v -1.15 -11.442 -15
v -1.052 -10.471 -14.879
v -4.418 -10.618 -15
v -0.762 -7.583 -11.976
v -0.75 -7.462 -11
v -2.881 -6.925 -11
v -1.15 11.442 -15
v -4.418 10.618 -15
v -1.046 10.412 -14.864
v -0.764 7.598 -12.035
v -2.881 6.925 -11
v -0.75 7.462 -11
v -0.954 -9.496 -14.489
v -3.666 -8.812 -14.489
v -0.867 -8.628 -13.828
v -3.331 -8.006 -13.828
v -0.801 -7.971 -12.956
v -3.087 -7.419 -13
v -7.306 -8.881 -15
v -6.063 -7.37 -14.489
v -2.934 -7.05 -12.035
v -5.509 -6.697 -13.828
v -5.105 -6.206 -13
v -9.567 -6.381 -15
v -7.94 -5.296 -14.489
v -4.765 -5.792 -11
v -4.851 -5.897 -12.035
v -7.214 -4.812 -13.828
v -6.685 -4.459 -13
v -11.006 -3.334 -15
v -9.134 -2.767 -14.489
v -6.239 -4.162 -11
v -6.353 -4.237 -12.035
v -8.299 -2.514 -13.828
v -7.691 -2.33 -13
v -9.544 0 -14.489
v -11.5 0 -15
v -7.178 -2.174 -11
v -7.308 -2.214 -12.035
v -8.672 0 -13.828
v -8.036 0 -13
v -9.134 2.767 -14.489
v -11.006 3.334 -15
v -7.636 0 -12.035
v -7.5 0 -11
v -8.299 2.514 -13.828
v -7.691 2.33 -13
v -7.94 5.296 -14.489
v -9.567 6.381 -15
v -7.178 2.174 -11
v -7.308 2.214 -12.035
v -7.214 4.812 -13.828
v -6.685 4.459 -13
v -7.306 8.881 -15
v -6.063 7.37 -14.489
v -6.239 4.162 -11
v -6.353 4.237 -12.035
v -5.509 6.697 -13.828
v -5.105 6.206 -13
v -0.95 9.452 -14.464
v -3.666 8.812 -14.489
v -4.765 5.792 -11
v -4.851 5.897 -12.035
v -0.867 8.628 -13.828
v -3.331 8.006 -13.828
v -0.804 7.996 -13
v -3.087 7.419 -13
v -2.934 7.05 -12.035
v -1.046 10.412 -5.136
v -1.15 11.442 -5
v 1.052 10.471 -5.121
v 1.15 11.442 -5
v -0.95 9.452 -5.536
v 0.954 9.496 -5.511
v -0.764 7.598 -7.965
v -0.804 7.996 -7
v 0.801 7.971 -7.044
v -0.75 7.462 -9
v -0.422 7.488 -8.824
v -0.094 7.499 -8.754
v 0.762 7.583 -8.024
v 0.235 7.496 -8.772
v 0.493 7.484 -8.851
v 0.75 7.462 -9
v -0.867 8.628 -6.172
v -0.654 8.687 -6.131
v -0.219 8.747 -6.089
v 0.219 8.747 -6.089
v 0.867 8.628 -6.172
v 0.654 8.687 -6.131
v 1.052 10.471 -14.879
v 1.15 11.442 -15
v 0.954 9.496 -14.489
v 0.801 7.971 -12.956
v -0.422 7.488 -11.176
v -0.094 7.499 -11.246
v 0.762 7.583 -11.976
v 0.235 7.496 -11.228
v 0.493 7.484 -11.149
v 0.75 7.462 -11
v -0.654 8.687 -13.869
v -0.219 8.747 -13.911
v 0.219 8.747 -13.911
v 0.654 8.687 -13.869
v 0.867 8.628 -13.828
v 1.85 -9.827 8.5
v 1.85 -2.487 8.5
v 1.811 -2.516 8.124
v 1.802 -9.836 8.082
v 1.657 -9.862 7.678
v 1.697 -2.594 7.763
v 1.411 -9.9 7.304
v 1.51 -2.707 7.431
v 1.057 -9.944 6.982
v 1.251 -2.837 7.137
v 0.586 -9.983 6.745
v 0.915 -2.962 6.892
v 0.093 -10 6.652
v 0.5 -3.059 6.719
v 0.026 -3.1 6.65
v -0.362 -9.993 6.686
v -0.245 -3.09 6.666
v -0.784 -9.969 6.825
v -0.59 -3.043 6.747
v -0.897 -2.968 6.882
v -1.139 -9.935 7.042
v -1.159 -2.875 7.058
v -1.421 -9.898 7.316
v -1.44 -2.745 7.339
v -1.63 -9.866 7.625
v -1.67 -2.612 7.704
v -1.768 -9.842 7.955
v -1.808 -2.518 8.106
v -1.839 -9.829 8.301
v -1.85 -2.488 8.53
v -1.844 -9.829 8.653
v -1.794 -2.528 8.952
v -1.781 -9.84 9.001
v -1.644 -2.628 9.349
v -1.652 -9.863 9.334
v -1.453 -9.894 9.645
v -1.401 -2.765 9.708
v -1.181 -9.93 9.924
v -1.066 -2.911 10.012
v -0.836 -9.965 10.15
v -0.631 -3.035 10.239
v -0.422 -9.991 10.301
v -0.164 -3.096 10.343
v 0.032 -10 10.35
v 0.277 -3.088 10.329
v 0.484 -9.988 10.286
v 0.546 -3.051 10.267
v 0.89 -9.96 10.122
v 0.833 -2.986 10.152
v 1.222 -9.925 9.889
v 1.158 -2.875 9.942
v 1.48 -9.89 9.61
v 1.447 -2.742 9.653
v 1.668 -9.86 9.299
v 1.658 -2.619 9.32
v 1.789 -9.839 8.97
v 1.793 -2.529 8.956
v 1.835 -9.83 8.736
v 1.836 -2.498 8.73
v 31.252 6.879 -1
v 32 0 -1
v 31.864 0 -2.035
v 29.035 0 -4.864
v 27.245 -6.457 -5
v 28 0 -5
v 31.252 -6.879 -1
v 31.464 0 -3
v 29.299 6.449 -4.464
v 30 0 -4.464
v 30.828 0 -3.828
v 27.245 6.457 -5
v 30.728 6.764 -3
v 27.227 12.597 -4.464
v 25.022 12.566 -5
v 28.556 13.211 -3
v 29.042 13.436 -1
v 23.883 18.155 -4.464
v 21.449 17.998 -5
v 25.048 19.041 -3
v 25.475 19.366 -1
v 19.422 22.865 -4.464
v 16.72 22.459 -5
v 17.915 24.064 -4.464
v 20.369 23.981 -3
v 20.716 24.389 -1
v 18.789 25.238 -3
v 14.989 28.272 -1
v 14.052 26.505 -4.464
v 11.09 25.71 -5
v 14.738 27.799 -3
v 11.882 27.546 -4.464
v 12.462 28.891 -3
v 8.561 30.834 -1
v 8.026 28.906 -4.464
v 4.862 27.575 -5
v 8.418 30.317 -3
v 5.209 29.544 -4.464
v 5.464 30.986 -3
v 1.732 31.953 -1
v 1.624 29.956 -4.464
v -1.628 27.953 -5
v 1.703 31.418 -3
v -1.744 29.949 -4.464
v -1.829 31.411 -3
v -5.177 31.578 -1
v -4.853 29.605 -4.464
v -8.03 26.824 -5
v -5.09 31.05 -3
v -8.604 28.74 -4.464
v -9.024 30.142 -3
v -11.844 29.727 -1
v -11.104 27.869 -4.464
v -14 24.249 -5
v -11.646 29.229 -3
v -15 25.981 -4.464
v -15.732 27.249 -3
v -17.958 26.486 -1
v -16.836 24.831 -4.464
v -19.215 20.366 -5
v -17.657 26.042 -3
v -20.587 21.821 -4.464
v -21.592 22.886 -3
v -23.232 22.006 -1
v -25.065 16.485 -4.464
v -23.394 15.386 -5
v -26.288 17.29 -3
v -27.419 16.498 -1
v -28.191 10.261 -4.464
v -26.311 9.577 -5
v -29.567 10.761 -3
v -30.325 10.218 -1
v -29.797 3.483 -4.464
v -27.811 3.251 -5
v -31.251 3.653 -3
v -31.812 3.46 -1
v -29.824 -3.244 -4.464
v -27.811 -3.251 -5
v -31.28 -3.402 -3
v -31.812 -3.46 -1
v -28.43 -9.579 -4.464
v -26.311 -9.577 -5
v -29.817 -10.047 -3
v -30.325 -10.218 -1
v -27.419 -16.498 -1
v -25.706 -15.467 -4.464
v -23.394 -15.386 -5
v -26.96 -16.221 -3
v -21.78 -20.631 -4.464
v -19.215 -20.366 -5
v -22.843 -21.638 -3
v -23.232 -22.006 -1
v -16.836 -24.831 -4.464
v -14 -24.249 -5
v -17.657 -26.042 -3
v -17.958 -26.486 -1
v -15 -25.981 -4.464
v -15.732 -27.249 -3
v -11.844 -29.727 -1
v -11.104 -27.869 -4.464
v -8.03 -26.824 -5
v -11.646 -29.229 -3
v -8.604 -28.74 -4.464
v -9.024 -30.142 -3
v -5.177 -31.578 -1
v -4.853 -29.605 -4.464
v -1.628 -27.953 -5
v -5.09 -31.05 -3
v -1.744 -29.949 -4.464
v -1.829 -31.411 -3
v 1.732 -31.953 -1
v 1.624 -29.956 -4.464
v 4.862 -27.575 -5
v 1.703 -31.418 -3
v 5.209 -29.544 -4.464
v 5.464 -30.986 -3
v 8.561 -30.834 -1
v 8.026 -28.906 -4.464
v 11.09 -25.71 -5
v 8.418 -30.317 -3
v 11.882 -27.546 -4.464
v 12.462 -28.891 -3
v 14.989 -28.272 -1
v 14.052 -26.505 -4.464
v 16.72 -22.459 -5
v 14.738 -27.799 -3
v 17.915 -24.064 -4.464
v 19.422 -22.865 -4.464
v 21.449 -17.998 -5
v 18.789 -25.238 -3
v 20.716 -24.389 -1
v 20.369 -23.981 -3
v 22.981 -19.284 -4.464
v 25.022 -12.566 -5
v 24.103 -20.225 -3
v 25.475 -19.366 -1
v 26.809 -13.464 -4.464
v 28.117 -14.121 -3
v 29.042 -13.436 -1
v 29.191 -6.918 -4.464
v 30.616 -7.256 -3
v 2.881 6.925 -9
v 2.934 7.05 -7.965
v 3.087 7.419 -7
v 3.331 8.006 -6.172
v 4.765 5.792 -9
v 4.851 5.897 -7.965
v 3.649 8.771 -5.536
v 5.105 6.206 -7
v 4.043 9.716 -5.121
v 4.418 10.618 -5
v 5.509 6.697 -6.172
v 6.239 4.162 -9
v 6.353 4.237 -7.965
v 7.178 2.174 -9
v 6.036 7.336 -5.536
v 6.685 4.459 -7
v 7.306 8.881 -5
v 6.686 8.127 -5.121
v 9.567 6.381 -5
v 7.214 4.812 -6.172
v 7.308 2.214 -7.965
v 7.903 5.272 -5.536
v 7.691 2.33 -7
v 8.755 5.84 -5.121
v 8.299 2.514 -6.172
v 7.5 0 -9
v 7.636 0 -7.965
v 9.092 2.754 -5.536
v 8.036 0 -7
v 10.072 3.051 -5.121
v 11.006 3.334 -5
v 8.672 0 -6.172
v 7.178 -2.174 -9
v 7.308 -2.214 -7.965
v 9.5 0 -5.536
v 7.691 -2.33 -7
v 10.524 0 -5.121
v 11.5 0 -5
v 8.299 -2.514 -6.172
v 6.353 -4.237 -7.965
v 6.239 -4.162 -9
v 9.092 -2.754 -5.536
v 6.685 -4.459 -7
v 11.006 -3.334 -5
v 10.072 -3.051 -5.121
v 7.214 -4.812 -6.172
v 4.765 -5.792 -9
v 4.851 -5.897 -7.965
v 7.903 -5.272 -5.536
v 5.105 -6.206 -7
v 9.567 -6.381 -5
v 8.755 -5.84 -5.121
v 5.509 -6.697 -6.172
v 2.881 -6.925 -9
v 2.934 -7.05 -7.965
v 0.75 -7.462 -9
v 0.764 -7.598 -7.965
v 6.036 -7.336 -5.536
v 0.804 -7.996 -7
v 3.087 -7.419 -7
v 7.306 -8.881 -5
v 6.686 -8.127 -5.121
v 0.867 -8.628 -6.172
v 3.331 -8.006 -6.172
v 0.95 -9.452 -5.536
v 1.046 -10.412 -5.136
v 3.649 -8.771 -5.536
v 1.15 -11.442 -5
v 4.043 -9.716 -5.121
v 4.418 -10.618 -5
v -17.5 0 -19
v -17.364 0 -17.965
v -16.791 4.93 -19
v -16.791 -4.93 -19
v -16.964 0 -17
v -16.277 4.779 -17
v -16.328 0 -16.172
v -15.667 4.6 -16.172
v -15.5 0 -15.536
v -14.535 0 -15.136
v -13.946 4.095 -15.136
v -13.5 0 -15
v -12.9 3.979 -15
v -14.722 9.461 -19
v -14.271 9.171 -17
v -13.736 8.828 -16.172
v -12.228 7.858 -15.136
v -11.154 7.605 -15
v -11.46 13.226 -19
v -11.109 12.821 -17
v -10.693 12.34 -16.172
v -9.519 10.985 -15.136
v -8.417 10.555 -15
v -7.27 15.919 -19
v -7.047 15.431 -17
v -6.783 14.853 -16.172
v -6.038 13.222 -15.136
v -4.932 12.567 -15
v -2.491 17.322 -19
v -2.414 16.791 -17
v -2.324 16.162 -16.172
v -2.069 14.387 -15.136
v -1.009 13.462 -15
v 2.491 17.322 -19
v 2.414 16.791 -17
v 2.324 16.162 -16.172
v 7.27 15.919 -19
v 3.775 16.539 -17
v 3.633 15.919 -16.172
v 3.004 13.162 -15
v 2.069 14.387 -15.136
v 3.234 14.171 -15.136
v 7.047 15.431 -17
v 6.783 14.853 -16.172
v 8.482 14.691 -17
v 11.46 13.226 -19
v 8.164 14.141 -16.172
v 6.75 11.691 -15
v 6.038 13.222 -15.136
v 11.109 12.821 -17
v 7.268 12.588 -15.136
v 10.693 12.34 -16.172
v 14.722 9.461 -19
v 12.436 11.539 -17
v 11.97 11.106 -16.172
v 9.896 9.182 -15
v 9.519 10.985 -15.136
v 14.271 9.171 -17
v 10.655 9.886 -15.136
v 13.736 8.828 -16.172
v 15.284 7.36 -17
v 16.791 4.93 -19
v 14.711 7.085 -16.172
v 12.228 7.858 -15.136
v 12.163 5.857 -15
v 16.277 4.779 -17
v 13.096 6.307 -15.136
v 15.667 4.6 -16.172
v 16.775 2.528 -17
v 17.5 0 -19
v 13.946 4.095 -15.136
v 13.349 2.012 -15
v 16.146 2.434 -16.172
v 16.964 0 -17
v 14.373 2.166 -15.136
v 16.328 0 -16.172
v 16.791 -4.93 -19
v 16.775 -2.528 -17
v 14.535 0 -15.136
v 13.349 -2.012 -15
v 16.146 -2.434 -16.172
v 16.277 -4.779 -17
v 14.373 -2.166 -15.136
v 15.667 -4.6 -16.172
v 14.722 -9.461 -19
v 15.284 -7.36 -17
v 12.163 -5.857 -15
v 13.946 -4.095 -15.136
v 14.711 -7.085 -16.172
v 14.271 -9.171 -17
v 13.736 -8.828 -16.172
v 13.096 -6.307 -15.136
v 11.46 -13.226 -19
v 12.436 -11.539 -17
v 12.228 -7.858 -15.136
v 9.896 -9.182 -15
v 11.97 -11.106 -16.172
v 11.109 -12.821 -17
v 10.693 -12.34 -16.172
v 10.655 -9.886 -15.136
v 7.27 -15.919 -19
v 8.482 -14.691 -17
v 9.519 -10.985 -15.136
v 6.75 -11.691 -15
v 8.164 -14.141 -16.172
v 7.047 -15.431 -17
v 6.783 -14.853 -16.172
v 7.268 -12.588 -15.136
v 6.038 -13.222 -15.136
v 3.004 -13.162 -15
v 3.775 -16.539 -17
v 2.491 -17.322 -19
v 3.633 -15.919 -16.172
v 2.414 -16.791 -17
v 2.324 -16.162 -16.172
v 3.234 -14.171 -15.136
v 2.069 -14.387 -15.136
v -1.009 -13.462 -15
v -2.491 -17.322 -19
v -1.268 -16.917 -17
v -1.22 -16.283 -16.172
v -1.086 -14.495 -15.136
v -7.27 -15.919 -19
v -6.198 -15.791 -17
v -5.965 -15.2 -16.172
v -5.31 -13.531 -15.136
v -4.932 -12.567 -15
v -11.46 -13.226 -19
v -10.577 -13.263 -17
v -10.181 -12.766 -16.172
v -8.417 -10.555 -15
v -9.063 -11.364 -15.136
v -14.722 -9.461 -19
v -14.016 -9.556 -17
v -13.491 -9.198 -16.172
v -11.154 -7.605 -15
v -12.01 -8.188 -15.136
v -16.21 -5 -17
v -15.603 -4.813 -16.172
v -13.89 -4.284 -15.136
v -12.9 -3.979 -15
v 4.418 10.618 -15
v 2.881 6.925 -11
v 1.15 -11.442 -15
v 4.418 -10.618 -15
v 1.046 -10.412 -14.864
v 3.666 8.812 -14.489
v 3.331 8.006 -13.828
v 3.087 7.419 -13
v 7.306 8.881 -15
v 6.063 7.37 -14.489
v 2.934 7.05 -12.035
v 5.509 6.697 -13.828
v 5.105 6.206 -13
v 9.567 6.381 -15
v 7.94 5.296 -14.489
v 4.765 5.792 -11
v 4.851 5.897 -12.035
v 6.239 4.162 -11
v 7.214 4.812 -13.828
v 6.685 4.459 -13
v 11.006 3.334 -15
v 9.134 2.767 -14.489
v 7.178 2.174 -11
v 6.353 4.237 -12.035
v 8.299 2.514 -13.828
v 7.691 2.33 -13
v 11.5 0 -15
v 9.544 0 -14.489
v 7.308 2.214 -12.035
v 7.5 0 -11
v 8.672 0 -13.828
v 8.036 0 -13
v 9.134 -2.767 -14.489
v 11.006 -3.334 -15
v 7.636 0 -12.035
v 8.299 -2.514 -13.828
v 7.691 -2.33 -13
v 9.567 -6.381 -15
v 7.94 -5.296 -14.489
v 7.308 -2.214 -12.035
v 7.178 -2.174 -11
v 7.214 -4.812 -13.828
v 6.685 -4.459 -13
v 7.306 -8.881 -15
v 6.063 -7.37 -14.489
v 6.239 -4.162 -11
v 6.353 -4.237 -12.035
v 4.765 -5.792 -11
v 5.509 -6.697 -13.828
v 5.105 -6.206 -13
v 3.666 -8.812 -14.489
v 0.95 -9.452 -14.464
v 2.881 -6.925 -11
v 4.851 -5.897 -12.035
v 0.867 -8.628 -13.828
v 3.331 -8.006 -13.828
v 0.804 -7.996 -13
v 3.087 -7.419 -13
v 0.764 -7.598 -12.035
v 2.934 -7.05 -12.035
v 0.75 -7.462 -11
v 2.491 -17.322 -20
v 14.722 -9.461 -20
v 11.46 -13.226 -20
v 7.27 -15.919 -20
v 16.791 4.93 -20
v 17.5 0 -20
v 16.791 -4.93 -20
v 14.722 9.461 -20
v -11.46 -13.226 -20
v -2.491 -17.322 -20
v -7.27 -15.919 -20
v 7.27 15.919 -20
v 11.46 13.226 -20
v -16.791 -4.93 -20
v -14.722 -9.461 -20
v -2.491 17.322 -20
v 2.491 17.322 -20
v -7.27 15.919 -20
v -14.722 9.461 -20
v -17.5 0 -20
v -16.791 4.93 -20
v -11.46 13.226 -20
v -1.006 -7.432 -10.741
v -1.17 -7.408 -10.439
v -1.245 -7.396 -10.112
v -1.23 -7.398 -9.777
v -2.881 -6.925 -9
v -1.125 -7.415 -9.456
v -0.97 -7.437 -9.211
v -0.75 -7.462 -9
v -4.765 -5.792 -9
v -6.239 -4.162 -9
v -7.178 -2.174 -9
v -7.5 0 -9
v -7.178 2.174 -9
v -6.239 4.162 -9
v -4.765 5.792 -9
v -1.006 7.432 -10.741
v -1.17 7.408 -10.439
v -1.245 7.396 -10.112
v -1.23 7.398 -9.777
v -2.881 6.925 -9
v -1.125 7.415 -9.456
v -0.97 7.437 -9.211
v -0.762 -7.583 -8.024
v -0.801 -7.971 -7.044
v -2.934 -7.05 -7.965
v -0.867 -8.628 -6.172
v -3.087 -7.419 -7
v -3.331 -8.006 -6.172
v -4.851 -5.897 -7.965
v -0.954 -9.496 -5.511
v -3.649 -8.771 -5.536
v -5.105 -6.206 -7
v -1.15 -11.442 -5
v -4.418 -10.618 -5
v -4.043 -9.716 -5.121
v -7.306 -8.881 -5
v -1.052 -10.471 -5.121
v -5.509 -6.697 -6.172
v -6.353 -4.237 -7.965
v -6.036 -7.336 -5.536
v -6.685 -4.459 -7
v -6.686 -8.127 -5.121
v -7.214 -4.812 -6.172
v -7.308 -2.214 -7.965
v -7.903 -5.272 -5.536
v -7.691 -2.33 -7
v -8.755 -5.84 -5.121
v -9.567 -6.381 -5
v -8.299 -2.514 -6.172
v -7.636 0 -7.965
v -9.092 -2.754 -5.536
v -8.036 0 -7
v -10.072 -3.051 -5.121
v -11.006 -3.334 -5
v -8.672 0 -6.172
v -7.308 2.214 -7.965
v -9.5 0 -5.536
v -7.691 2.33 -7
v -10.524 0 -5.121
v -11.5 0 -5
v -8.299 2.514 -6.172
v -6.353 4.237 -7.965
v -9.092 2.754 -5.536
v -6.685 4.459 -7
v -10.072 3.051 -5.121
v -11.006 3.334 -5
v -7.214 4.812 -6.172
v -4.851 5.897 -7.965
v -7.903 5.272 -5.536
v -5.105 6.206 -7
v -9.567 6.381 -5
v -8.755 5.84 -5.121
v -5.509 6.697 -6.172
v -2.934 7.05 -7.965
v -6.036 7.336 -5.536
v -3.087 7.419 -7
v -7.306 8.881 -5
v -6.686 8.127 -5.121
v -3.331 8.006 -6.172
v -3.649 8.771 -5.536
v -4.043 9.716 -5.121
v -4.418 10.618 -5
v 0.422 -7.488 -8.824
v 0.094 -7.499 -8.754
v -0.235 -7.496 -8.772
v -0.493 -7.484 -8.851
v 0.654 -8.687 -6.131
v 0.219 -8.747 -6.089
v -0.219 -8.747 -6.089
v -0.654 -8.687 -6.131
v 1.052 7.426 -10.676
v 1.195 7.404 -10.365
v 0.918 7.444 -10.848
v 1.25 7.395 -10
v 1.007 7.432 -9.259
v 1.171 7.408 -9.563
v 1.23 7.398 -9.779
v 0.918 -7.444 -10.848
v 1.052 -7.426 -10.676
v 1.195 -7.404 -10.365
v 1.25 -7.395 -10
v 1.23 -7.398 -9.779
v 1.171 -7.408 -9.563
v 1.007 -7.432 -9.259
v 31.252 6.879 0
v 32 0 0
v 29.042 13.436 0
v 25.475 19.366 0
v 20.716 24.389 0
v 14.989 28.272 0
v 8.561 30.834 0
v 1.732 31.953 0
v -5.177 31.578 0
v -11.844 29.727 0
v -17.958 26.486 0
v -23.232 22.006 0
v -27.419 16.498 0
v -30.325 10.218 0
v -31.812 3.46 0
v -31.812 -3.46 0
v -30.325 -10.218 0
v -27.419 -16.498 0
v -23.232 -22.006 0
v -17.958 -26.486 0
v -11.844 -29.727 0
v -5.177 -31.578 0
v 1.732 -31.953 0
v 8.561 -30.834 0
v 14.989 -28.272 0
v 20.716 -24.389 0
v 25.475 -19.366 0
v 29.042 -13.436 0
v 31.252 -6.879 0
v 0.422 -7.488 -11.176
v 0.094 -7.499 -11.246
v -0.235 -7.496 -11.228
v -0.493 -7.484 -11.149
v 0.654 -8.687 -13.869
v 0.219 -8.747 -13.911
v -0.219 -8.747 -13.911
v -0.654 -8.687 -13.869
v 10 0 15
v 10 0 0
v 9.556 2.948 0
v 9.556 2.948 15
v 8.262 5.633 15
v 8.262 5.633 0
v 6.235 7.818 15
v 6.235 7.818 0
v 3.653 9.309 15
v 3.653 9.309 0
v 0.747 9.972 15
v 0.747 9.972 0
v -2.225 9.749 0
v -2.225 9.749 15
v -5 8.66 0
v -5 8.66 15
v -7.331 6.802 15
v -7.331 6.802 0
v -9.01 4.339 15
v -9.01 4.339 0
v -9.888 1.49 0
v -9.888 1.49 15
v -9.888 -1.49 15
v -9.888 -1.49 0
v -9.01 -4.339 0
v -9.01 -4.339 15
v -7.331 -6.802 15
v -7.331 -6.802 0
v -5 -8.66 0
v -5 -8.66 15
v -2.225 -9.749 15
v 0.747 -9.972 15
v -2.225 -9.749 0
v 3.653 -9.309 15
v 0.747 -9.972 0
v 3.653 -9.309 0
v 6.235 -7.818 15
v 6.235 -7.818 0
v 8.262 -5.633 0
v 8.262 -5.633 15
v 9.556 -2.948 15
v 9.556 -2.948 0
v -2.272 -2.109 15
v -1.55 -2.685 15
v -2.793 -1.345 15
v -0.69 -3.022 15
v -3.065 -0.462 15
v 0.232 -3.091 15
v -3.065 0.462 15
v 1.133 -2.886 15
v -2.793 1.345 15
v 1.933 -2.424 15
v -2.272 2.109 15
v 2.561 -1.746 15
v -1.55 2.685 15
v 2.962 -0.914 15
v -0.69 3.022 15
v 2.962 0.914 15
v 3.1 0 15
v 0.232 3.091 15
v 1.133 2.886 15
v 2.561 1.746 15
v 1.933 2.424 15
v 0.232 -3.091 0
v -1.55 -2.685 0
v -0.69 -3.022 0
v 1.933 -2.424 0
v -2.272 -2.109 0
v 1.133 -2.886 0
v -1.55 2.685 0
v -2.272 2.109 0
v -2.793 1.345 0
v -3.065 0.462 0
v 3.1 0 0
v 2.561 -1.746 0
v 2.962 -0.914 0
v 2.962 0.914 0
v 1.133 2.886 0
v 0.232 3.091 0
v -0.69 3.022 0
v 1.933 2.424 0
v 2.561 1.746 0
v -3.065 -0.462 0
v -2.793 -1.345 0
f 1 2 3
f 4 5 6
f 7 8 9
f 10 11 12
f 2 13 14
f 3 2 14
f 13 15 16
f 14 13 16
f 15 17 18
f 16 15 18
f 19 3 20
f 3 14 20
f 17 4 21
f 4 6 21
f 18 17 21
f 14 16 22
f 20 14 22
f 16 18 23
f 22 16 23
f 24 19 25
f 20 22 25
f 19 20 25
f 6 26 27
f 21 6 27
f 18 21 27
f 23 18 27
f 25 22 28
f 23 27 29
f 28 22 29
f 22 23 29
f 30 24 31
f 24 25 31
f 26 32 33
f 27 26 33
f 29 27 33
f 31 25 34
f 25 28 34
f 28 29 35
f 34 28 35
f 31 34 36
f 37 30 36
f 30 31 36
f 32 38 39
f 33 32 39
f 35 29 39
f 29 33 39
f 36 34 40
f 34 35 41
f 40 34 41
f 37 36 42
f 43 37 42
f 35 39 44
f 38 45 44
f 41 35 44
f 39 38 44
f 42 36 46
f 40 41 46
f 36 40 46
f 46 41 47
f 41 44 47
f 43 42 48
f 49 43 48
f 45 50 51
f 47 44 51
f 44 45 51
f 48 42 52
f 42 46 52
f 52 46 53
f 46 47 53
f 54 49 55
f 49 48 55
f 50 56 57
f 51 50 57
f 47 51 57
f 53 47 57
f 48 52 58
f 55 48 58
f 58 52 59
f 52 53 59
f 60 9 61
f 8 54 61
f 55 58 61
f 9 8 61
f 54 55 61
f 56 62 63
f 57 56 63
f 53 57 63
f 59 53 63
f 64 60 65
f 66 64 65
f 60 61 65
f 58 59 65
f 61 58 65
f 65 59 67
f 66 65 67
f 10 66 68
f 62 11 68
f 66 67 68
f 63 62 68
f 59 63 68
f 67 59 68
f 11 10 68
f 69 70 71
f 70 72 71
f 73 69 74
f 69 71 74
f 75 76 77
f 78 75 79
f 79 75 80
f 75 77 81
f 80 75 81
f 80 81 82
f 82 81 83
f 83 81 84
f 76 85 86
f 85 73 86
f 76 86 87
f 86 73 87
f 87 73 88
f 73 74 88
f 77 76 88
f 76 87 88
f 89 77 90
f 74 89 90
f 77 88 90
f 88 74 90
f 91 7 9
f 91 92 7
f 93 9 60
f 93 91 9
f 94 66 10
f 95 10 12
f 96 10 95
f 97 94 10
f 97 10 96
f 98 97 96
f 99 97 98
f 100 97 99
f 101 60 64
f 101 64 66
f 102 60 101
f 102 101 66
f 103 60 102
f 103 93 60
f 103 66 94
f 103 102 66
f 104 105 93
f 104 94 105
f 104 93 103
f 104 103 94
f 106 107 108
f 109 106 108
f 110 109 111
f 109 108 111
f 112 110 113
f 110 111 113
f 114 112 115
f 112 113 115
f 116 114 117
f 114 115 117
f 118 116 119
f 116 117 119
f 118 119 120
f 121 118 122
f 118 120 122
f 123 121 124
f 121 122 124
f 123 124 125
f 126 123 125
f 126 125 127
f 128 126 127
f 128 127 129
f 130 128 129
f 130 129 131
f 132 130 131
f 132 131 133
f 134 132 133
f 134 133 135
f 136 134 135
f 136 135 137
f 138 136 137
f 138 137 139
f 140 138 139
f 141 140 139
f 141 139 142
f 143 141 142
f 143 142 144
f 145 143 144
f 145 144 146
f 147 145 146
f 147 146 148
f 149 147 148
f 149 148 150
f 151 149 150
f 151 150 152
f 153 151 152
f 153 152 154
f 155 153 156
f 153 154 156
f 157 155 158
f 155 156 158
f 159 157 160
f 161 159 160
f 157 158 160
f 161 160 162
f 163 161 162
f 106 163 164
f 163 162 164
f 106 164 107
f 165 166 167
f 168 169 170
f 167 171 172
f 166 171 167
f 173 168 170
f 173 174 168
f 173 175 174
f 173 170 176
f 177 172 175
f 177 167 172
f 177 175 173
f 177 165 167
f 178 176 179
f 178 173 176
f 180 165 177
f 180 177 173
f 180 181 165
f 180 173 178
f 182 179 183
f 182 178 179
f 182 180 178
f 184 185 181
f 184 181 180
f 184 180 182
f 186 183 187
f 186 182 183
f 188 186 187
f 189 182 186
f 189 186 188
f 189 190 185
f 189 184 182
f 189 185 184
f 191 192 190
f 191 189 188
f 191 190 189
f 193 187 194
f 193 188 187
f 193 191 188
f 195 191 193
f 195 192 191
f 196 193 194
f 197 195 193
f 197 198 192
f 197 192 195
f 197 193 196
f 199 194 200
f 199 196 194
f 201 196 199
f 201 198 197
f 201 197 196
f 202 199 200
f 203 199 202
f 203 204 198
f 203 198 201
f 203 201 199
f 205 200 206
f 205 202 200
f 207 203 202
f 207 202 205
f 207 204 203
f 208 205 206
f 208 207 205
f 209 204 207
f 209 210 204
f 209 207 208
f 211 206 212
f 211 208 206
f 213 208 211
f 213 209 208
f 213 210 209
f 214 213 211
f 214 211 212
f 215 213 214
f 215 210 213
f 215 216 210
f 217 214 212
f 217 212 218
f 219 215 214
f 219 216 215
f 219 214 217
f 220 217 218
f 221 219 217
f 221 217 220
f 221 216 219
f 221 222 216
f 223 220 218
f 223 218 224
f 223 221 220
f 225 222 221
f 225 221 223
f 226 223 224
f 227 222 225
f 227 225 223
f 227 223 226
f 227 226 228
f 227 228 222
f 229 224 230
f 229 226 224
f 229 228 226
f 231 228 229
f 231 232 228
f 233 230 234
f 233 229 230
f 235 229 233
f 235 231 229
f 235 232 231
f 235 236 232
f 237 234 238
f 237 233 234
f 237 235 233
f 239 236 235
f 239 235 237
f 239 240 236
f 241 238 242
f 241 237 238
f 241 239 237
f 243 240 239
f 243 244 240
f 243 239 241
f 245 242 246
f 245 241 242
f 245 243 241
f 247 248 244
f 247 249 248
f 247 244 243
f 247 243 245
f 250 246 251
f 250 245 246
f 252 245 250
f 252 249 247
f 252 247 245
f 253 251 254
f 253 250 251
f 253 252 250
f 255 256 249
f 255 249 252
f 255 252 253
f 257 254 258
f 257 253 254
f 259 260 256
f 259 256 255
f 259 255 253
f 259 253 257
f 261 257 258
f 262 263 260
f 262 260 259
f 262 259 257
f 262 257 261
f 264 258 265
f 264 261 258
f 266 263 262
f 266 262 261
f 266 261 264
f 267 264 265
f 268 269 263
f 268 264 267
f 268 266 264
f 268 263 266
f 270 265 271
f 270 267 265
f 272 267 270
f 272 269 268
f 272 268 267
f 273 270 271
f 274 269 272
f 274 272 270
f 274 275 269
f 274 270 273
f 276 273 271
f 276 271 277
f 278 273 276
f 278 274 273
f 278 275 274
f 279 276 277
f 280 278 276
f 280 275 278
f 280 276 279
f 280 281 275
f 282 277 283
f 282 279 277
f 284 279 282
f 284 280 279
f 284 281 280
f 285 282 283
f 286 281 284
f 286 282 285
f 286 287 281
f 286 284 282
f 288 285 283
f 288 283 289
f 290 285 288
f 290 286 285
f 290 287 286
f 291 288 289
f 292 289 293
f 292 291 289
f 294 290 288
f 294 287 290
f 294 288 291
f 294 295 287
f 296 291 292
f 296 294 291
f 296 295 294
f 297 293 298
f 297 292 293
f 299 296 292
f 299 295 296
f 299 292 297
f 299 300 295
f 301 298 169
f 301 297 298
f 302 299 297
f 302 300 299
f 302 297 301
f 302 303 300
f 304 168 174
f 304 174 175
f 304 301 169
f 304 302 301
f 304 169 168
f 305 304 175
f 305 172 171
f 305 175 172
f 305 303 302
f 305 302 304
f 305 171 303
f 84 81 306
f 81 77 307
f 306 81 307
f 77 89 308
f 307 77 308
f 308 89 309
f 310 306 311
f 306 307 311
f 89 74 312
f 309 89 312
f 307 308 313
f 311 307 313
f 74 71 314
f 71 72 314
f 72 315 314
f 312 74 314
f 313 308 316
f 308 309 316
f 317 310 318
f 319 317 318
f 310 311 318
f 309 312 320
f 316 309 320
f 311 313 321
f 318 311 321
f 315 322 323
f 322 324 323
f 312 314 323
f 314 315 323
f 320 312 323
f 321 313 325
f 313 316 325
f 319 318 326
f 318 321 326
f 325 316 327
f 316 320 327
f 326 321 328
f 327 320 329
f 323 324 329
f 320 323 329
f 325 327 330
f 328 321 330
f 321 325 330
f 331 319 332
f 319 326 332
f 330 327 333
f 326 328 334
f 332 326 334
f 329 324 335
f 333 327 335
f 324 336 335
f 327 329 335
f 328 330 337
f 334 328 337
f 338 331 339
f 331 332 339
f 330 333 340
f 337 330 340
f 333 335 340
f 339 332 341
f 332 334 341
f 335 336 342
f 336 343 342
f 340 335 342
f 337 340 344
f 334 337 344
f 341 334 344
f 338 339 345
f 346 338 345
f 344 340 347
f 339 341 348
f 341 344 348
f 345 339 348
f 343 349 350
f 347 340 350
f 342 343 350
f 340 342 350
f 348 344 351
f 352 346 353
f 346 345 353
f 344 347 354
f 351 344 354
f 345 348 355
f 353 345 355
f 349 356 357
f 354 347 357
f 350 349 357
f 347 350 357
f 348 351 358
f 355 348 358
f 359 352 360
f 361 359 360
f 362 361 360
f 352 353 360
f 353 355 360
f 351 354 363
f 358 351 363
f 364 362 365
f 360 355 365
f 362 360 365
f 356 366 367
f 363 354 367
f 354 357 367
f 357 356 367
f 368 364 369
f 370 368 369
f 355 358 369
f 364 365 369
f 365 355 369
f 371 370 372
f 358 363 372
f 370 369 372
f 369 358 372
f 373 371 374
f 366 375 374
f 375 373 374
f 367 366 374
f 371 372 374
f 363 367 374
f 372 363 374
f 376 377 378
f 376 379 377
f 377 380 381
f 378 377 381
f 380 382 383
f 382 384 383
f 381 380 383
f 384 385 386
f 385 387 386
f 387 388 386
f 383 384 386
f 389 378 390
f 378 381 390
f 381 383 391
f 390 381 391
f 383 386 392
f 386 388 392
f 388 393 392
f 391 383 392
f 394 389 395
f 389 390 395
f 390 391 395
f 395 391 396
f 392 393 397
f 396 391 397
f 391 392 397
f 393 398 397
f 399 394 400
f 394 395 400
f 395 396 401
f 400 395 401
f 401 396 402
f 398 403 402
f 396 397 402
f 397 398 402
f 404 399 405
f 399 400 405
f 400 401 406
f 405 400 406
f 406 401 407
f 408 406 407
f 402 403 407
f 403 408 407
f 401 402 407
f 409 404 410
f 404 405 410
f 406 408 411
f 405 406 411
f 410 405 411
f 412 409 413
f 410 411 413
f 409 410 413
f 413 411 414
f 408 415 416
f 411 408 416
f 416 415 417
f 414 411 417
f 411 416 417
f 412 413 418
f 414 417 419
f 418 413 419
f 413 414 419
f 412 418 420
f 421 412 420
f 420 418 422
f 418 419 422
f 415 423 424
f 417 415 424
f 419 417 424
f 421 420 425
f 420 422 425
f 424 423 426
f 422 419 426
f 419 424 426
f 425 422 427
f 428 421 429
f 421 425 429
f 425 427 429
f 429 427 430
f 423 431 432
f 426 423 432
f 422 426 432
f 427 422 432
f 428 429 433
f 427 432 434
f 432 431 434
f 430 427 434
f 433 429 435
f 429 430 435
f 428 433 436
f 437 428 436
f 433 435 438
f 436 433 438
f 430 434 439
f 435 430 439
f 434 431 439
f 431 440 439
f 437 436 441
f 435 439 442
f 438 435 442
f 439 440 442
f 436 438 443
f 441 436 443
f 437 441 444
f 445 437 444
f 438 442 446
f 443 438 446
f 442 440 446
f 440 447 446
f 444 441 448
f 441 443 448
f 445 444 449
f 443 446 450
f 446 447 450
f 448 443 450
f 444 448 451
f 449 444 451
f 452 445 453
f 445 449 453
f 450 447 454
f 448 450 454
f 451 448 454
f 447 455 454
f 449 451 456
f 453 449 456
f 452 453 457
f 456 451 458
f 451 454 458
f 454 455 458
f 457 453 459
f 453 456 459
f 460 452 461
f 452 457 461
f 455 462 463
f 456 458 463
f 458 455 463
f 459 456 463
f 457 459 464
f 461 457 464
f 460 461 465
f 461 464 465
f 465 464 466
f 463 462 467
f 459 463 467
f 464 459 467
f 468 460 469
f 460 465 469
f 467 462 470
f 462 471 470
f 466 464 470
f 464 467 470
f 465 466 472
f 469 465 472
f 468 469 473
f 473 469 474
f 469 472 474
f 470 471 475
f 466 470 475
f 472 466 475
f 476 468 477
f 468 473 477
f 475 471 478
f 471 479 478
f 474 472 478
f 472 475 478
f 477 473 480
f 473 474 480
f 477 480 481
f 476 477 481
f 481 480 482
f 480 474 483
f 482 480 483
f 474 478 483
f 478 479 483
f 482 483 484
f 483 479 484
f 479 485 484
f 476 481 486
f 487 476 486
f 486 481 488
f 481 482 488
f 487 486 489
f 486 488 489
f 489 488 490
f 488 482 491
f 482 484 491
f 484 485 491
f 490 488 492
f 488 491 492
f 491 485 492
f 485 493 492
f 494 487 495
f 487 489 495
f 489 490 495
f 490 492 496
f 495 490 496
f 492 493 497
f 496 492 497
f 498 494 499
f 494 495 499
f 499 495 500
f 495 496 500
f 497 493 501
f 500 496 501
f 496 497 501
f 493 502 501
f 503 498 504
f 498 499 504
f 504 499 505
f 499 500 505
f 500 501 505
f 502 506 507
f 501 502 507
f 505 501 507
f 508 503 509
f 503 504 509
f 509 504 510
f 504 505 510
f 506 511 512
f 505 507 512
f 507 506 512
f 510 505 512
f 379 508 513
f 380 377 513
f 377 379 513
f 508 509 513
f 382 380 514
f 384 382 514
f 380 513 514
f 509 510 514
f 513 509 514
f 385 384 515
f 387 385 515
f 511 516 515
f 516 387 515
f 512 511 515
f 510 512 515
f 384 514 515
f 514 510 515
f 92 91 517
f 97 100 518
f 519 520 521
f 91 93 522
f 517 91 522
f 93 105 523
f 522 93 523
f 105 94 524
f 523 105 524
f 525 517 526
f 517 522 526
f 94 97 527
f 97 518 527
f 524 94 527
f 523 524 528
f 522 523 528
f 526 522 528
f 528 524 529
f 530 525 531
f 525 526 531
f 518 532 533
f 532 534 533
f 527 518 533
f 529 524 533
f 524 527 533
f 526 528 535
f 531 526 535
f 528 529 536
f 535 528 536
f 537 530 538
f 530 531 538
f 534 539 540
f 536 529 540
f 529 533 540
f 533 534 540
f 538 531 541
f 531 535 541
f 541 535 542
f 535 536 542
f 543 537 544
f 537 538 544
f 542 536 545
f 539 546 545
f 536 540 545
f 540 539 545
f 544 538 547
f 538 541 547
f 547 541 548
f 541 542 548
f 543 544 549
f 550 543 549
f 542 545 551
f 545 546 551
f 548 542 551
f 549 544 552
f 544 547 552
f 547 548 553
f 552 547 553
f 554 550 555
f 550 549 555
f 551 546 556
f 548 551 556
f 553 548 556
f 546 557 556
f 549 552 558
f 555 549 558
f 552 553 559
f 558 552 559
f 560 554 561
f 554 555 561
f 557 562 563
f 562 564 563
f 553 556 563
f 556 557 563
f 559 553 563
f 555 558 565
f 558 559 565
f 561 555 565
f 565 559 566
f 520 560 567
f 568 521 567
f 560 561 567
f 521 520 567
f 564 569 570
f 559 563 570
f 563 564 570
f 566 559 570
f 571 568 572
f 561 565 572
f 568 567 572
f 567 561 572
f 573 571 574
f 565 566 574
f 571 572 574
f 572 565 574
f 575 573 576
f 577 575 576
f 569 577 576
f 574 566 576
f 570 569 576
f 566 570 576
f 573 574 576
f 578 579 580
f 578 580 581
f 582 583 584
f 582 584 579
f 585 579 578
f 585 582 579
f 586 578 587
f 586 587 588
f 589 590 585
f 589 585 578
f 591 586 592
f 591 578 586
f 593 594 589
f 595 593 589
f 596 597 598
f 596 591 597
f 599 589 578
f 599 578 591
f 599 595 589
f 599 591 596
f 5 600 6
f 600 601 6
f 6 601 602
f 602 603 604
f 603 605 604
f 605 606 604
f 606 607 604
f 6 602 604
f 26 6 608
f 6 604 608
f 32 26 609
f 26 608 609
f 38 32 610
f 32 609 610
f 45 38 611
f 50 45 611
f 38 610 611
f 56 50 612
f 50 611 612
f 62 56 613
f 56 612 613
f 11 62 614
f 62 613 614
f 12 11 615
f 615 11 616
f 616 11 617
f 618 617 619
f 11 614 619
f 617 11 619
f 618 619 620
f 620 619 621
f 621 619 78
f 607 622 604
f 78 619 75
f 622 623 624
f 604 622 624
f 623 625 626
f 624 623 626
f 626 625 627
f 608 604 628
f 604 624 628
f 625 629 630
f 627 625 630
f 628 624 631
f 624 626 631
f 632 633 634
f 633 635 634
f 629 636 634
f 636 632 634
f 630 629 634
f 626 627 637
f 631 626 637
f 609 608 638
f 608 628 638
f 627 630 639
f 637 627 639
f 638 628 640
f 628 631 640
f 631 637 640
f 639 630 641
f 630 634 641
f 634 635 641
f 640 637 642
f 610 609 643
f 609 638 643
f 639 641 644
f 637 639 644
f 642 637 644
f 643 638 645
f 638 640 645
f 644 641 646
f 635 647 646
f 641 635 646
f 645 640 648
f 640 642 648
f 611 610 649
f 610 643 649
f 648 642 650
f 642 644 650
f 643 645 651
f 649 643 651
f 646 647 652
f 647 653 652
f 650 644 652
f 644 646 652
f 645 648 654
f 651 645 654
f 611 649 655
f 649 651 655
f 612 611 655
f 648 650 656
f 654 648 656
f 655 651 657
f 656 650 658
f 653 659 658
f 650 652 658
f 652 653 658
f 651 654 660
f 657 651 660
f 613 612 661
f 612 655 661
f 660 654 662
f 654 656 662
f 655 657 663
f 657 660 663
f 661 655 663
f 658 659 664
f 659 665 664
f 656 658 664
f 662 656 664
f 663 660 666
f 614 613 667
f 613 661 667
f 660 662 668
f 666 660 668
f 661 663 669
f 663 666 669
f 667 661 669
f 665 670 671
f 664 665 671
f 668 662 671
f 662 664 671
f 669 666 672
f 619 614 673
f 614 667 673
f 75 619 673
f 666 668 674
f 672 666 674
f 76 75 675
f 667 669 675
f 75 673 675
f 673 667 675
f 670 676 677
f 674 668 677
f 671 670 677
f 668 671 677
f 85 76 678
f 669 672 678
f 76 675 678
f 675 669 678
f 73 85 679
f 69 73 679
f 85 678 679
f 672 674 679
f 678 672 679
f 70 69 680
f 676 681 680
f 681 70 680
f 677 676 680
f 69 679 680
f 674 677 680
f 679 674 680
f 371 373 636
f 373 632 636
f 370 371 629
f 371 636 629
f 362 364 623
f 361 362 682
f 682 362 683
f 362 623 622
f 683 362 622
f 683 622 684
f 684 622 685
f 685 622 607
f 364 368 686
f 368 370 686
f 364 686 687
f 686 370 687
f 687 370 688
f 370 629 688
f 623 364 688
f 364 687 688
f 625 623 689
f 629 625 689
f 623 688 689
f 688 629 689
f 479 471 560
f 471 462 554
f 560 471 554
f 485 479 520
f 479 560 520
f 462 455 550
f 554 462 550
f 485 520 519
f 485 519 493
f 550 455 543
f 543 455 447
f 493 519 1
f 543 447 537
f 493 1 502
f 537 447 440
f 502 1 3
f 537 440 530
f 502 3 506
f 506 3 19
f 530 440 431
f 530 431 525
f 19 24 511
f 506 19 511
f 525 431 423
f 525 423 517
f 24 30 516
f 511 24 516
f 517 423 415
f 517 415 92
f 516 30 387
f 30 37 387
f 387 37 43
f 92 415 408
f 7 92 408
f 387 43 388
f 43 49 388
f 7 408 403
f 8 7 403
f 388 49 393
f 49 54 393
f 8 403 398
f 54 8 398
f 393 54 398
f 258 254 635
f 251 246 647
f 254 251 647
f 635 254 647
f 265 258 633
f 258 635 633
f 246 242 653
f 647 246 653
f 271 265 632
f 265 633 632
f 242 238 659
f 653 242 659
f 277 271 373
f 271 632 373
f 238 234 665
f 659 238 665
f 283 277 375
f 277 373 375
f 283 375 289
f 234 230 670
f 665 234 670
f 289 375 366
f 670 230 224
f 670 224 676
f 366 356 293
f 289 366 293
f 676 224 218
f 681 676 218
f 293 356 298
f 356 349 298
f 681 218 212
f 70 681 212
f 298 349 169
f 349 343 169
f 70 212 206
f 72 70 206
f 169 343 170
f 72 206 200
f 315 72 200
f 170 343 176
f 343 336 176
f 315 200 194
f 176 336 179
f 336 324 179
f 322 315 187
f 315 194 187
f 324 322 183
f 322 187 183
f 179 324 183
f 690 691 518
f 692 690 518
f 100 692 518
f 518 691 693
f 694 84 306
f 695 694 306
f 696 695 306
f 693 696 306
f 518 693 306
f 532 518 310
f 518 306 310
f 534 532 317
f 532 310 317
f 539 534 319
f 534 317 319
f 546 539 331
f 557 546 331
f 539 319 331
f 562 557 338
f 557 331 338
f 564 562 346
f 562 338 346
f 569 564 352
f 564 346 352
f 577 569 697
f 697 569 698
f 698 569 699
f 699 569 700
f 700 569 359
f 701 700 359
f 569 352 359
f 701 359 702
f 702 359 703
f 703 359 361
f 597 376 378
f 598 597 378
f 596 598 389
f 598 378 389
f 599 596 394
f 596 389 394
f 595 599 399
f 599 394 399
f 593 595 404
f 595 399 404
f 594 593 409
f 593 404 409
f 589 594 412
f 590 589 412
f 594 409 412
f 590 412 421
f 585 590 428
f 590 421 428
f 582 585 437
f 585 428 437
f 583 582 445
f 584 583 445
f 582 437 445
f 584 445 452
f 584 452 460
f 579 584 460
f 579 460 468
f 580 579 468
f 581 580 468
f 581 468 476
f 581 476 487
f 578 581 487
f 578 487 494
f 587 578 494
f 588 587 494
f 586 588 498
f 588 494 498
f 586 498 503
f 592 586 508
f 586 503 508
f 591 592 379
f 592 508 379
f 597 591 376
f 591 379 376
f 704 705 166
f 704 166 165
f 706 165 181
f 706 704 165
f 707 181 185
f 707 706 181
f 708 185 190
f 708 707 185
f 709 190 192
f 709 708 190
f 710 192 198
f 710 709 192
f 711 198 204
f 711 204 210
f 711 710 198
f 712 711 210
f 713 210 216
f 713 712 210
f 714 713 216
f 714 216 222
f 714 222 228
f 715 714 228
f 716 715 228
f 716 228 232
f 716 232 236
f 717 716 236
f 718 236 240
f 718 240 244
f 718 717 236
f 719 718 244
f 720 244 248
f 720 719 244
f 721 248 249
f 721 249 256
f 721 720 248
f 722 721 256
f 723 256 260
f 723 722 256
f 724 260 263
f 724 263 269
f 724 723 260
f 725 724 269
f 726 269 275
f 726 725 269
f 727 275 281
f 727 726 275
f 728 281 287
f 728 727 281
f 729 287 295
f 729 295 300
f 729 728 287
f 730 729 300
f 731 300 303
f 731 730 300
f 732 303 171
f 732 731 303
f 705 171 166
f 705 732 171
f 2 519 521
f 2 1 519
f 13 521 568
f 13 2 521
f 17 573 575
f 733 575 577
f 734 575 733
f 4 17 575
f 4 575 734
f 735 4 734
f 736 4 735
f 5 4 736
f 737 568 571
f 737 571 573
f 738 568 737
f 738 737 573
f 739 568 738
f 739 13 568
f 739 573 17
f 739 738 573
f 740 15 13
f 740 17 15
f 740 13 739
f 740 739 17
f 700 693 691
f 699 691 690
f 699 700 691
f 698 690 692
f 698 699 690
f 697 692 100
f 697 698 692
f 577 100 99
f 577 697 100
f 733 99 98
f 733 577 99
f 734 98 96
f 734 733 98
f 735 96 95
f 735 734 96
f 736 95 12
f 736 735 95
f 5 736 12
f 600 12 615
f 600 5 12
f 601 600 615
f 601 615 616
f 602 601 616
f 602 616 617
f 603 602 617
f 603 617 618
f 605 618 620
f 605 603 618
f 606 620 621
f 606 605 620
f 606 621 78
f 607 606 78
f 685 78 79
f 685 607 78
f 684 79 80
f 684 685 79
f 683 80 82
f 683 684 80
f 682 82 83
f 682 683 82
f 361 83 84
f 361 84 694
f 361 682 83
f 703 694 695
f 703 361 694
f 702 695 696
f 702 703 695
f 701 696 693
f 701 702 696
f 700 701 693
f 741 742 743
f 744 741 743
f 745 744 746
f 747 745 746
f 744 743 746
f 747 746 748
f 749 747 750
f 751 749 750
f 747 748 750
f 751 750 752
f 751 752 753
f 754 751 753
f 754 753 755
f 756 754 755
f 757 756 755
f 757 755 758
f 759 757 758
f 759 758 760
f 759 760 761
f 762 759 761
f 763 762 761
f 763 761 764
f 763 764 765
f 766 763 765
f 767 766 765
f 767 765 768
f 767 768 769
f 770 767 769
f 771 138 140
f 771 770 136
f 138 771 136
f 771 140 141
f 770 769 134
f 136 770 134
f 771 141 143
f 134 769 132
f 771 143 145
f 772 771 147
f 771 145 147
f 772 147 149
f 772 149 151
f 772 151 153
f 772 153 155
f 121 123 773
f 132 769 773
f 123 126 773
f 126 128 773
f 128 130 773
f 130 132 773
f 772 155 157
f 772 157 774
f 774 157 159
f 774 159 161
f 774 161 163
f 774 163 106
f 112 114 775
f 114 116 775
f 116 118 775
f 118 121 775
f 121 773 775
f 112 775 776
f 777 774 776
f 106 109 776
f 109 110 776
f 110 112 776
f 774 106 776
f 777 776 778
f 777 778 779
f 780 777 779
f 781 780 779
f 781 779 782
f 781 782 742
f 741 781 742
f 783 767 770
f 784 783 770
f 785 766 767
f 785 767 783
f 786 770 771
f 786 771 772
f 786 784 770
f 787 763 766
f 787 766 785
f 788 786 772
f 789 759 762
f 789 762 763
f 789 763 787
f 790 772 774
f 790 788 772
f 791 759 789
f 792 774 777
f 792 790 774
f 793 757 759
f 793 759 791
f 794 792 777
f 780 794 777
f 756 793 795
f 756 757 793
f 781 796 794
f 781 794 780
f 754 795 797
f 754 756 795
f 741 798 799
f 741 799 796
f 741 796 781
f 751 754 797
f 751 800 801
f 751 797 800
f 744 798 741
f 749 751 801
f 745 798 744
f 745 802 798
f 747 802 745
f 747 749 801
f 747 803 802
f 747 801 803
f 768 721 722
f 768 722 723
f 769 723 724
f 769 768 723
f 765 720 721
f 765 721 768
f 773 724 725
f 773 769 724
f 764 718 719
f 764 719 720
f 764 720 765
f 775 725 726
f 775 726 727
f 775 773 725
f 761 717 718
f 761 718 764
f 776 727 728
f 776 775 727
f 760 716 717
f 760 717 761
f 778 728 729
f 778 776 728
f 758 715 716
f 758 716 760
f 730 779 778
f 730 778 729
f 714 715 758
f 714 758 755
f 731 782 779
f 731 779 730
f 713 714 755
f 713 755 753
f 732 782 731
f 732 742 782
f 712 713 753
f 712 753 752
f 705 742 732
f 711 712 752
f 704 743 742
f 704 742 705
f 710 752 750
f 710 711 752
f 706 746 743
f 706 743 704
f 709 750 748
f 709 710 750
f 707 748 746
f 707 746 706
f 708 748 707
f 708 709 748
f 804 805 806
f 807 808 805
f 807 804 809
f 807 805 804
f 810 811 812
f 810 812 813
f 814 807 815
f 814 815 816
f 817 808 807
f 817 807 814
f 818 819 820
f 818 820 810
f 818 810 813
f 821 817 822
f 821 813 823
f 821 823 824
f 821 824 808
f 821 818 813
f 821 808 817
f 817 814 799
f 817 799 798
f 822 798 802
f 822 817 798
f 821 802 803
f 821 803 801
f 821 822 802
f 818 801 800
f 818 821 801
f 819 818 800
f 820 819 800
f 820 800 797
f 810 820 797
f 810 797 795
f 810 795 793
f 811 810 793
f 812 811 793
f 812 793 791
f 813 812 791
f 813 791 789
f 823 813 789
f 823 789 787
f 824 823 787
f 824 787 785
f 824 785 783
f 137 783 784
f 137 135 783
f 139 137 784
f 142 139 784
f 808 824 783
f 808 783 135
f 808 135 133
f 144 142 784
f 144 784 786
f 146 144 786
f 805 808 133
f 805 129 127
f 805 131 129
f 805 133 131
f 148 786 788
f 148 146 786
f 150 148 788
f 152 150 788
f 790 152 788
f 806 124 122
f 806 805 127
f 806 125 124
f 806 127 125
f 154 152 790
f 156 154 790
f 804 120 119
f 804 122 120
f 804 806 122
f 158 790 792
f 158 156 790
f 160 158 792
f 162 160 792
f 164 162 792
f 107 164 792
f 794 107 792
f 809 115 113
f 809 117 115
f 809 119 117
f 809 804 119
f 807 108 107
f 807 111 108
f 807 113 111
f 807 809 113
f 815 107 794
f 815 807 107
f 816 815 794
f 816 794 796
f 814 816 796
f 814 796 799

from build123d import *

# Parameters (mm, degrees)
SKETCH_1_R               = 10
SKETCH_1_R_2             = 3.1
EXTRUDE_1_DEPTH          = 15
SKETCH_2_R               = 32
EXTRUDE_2_DEPTH          = 5
SKETCH_3_R               = 7.5
EXTRUDE_3_DEPTH          = 10
SKETCH_4_R               = 17.5
EXTRUDE_4_DEPTH          = 5
SKETCH_5_R               = 1.85
CUT_EXTRUDE_1_DEPTH      = 33
SKETCH_5_3_R             = 1.25
CUT_EXTRUDE_2_DEPTH      = 33
CUT_EXTRUDE_2_DEPTH_BACK = 33
FILLET_1_R               = 4


with BuildPart() as part:
    # Sketch 1 → Extrude 1 (new body)
    with BuildSketch(Plane.XY):
        Circle(SKETCH_1_R)
        Circle(SKETCH_1_R_2, mode=Mode.SUBTRACT)
    extrude(amount=EXTRUDE_1_DEPTH)

    # Sketch 2 → Extrude 2 (add)
    with BuildSketch(Plane.XY):
        Circle(SKETCH_2_R)
    extrude(amount=-EXTRUDE_2_DEPTH)

    # Sketch 3 → Extrude 3 (add)
    with BuildSketch(Plane(origin=(0, 0, -5), x_dir=(-1, 0, 0), z_dir=(0, 0, -1))):
        Circle(SKETCH_3_R)
    extrude(amount=EXTRUDE_3_DEPTH)

    # Sketch 4 → Extrude 4 (add)
    with BuildSketch(Plane(origin=(0, 0, -15), x_dir=(-1, 0, 0), z_dir=(0, 0, -1))):
        Circle(SKETCH_4_R)
    extrude(amount=EXTRUDE_4_DEPTH)

    # Sketch 5 → Cut-Extrude 1 (cut, through all)
    with BuildSketch(Plane(origin=(0, 0, 0), x_dir=(1, 0, 0), z_dir=(0, 1, 0))):
        with Locations((0, -8.5)):
            Circle(SKETCH_5_R)
    extrude(amount=-CUT_EXTRUDE_1_DEPTH, mode=Mode.SUBTRACT)

    # Sketch 5_3 → Cut-Extrude 2 (cut, two sides)
    with BuildSketch(Plane(origin=(0, 0, 0), x_dir=(1, 0, 0), z_dir=(0, 1, 0))) as cut_extrude_2_sk:
        with Locations((0, 10)):
            Circle(SKETCH_5_3_R)
    extrude(amount=CUT_EXTRUDE_2_DEPTH, mode=Mode.SUBTRACT)
    extrude(cut_extrude_2_sk.sketch, amount=-CUT_EXTRUDE_2_DEPTH_BACK, mode=Mode.SUBTRACT)

    # Fillet 1
    fillet_1_edges = [part.edges().sort_by_distance(p)[0] for p in [
        (-32, 0, -5),
        (7.5, 0, -5),
        (7.5, 0, -15),
        (17.5, 0, -15),
    ]]
    fillet(fillet_1_edges, radius=FILLET_1_R)


solid = part.part
